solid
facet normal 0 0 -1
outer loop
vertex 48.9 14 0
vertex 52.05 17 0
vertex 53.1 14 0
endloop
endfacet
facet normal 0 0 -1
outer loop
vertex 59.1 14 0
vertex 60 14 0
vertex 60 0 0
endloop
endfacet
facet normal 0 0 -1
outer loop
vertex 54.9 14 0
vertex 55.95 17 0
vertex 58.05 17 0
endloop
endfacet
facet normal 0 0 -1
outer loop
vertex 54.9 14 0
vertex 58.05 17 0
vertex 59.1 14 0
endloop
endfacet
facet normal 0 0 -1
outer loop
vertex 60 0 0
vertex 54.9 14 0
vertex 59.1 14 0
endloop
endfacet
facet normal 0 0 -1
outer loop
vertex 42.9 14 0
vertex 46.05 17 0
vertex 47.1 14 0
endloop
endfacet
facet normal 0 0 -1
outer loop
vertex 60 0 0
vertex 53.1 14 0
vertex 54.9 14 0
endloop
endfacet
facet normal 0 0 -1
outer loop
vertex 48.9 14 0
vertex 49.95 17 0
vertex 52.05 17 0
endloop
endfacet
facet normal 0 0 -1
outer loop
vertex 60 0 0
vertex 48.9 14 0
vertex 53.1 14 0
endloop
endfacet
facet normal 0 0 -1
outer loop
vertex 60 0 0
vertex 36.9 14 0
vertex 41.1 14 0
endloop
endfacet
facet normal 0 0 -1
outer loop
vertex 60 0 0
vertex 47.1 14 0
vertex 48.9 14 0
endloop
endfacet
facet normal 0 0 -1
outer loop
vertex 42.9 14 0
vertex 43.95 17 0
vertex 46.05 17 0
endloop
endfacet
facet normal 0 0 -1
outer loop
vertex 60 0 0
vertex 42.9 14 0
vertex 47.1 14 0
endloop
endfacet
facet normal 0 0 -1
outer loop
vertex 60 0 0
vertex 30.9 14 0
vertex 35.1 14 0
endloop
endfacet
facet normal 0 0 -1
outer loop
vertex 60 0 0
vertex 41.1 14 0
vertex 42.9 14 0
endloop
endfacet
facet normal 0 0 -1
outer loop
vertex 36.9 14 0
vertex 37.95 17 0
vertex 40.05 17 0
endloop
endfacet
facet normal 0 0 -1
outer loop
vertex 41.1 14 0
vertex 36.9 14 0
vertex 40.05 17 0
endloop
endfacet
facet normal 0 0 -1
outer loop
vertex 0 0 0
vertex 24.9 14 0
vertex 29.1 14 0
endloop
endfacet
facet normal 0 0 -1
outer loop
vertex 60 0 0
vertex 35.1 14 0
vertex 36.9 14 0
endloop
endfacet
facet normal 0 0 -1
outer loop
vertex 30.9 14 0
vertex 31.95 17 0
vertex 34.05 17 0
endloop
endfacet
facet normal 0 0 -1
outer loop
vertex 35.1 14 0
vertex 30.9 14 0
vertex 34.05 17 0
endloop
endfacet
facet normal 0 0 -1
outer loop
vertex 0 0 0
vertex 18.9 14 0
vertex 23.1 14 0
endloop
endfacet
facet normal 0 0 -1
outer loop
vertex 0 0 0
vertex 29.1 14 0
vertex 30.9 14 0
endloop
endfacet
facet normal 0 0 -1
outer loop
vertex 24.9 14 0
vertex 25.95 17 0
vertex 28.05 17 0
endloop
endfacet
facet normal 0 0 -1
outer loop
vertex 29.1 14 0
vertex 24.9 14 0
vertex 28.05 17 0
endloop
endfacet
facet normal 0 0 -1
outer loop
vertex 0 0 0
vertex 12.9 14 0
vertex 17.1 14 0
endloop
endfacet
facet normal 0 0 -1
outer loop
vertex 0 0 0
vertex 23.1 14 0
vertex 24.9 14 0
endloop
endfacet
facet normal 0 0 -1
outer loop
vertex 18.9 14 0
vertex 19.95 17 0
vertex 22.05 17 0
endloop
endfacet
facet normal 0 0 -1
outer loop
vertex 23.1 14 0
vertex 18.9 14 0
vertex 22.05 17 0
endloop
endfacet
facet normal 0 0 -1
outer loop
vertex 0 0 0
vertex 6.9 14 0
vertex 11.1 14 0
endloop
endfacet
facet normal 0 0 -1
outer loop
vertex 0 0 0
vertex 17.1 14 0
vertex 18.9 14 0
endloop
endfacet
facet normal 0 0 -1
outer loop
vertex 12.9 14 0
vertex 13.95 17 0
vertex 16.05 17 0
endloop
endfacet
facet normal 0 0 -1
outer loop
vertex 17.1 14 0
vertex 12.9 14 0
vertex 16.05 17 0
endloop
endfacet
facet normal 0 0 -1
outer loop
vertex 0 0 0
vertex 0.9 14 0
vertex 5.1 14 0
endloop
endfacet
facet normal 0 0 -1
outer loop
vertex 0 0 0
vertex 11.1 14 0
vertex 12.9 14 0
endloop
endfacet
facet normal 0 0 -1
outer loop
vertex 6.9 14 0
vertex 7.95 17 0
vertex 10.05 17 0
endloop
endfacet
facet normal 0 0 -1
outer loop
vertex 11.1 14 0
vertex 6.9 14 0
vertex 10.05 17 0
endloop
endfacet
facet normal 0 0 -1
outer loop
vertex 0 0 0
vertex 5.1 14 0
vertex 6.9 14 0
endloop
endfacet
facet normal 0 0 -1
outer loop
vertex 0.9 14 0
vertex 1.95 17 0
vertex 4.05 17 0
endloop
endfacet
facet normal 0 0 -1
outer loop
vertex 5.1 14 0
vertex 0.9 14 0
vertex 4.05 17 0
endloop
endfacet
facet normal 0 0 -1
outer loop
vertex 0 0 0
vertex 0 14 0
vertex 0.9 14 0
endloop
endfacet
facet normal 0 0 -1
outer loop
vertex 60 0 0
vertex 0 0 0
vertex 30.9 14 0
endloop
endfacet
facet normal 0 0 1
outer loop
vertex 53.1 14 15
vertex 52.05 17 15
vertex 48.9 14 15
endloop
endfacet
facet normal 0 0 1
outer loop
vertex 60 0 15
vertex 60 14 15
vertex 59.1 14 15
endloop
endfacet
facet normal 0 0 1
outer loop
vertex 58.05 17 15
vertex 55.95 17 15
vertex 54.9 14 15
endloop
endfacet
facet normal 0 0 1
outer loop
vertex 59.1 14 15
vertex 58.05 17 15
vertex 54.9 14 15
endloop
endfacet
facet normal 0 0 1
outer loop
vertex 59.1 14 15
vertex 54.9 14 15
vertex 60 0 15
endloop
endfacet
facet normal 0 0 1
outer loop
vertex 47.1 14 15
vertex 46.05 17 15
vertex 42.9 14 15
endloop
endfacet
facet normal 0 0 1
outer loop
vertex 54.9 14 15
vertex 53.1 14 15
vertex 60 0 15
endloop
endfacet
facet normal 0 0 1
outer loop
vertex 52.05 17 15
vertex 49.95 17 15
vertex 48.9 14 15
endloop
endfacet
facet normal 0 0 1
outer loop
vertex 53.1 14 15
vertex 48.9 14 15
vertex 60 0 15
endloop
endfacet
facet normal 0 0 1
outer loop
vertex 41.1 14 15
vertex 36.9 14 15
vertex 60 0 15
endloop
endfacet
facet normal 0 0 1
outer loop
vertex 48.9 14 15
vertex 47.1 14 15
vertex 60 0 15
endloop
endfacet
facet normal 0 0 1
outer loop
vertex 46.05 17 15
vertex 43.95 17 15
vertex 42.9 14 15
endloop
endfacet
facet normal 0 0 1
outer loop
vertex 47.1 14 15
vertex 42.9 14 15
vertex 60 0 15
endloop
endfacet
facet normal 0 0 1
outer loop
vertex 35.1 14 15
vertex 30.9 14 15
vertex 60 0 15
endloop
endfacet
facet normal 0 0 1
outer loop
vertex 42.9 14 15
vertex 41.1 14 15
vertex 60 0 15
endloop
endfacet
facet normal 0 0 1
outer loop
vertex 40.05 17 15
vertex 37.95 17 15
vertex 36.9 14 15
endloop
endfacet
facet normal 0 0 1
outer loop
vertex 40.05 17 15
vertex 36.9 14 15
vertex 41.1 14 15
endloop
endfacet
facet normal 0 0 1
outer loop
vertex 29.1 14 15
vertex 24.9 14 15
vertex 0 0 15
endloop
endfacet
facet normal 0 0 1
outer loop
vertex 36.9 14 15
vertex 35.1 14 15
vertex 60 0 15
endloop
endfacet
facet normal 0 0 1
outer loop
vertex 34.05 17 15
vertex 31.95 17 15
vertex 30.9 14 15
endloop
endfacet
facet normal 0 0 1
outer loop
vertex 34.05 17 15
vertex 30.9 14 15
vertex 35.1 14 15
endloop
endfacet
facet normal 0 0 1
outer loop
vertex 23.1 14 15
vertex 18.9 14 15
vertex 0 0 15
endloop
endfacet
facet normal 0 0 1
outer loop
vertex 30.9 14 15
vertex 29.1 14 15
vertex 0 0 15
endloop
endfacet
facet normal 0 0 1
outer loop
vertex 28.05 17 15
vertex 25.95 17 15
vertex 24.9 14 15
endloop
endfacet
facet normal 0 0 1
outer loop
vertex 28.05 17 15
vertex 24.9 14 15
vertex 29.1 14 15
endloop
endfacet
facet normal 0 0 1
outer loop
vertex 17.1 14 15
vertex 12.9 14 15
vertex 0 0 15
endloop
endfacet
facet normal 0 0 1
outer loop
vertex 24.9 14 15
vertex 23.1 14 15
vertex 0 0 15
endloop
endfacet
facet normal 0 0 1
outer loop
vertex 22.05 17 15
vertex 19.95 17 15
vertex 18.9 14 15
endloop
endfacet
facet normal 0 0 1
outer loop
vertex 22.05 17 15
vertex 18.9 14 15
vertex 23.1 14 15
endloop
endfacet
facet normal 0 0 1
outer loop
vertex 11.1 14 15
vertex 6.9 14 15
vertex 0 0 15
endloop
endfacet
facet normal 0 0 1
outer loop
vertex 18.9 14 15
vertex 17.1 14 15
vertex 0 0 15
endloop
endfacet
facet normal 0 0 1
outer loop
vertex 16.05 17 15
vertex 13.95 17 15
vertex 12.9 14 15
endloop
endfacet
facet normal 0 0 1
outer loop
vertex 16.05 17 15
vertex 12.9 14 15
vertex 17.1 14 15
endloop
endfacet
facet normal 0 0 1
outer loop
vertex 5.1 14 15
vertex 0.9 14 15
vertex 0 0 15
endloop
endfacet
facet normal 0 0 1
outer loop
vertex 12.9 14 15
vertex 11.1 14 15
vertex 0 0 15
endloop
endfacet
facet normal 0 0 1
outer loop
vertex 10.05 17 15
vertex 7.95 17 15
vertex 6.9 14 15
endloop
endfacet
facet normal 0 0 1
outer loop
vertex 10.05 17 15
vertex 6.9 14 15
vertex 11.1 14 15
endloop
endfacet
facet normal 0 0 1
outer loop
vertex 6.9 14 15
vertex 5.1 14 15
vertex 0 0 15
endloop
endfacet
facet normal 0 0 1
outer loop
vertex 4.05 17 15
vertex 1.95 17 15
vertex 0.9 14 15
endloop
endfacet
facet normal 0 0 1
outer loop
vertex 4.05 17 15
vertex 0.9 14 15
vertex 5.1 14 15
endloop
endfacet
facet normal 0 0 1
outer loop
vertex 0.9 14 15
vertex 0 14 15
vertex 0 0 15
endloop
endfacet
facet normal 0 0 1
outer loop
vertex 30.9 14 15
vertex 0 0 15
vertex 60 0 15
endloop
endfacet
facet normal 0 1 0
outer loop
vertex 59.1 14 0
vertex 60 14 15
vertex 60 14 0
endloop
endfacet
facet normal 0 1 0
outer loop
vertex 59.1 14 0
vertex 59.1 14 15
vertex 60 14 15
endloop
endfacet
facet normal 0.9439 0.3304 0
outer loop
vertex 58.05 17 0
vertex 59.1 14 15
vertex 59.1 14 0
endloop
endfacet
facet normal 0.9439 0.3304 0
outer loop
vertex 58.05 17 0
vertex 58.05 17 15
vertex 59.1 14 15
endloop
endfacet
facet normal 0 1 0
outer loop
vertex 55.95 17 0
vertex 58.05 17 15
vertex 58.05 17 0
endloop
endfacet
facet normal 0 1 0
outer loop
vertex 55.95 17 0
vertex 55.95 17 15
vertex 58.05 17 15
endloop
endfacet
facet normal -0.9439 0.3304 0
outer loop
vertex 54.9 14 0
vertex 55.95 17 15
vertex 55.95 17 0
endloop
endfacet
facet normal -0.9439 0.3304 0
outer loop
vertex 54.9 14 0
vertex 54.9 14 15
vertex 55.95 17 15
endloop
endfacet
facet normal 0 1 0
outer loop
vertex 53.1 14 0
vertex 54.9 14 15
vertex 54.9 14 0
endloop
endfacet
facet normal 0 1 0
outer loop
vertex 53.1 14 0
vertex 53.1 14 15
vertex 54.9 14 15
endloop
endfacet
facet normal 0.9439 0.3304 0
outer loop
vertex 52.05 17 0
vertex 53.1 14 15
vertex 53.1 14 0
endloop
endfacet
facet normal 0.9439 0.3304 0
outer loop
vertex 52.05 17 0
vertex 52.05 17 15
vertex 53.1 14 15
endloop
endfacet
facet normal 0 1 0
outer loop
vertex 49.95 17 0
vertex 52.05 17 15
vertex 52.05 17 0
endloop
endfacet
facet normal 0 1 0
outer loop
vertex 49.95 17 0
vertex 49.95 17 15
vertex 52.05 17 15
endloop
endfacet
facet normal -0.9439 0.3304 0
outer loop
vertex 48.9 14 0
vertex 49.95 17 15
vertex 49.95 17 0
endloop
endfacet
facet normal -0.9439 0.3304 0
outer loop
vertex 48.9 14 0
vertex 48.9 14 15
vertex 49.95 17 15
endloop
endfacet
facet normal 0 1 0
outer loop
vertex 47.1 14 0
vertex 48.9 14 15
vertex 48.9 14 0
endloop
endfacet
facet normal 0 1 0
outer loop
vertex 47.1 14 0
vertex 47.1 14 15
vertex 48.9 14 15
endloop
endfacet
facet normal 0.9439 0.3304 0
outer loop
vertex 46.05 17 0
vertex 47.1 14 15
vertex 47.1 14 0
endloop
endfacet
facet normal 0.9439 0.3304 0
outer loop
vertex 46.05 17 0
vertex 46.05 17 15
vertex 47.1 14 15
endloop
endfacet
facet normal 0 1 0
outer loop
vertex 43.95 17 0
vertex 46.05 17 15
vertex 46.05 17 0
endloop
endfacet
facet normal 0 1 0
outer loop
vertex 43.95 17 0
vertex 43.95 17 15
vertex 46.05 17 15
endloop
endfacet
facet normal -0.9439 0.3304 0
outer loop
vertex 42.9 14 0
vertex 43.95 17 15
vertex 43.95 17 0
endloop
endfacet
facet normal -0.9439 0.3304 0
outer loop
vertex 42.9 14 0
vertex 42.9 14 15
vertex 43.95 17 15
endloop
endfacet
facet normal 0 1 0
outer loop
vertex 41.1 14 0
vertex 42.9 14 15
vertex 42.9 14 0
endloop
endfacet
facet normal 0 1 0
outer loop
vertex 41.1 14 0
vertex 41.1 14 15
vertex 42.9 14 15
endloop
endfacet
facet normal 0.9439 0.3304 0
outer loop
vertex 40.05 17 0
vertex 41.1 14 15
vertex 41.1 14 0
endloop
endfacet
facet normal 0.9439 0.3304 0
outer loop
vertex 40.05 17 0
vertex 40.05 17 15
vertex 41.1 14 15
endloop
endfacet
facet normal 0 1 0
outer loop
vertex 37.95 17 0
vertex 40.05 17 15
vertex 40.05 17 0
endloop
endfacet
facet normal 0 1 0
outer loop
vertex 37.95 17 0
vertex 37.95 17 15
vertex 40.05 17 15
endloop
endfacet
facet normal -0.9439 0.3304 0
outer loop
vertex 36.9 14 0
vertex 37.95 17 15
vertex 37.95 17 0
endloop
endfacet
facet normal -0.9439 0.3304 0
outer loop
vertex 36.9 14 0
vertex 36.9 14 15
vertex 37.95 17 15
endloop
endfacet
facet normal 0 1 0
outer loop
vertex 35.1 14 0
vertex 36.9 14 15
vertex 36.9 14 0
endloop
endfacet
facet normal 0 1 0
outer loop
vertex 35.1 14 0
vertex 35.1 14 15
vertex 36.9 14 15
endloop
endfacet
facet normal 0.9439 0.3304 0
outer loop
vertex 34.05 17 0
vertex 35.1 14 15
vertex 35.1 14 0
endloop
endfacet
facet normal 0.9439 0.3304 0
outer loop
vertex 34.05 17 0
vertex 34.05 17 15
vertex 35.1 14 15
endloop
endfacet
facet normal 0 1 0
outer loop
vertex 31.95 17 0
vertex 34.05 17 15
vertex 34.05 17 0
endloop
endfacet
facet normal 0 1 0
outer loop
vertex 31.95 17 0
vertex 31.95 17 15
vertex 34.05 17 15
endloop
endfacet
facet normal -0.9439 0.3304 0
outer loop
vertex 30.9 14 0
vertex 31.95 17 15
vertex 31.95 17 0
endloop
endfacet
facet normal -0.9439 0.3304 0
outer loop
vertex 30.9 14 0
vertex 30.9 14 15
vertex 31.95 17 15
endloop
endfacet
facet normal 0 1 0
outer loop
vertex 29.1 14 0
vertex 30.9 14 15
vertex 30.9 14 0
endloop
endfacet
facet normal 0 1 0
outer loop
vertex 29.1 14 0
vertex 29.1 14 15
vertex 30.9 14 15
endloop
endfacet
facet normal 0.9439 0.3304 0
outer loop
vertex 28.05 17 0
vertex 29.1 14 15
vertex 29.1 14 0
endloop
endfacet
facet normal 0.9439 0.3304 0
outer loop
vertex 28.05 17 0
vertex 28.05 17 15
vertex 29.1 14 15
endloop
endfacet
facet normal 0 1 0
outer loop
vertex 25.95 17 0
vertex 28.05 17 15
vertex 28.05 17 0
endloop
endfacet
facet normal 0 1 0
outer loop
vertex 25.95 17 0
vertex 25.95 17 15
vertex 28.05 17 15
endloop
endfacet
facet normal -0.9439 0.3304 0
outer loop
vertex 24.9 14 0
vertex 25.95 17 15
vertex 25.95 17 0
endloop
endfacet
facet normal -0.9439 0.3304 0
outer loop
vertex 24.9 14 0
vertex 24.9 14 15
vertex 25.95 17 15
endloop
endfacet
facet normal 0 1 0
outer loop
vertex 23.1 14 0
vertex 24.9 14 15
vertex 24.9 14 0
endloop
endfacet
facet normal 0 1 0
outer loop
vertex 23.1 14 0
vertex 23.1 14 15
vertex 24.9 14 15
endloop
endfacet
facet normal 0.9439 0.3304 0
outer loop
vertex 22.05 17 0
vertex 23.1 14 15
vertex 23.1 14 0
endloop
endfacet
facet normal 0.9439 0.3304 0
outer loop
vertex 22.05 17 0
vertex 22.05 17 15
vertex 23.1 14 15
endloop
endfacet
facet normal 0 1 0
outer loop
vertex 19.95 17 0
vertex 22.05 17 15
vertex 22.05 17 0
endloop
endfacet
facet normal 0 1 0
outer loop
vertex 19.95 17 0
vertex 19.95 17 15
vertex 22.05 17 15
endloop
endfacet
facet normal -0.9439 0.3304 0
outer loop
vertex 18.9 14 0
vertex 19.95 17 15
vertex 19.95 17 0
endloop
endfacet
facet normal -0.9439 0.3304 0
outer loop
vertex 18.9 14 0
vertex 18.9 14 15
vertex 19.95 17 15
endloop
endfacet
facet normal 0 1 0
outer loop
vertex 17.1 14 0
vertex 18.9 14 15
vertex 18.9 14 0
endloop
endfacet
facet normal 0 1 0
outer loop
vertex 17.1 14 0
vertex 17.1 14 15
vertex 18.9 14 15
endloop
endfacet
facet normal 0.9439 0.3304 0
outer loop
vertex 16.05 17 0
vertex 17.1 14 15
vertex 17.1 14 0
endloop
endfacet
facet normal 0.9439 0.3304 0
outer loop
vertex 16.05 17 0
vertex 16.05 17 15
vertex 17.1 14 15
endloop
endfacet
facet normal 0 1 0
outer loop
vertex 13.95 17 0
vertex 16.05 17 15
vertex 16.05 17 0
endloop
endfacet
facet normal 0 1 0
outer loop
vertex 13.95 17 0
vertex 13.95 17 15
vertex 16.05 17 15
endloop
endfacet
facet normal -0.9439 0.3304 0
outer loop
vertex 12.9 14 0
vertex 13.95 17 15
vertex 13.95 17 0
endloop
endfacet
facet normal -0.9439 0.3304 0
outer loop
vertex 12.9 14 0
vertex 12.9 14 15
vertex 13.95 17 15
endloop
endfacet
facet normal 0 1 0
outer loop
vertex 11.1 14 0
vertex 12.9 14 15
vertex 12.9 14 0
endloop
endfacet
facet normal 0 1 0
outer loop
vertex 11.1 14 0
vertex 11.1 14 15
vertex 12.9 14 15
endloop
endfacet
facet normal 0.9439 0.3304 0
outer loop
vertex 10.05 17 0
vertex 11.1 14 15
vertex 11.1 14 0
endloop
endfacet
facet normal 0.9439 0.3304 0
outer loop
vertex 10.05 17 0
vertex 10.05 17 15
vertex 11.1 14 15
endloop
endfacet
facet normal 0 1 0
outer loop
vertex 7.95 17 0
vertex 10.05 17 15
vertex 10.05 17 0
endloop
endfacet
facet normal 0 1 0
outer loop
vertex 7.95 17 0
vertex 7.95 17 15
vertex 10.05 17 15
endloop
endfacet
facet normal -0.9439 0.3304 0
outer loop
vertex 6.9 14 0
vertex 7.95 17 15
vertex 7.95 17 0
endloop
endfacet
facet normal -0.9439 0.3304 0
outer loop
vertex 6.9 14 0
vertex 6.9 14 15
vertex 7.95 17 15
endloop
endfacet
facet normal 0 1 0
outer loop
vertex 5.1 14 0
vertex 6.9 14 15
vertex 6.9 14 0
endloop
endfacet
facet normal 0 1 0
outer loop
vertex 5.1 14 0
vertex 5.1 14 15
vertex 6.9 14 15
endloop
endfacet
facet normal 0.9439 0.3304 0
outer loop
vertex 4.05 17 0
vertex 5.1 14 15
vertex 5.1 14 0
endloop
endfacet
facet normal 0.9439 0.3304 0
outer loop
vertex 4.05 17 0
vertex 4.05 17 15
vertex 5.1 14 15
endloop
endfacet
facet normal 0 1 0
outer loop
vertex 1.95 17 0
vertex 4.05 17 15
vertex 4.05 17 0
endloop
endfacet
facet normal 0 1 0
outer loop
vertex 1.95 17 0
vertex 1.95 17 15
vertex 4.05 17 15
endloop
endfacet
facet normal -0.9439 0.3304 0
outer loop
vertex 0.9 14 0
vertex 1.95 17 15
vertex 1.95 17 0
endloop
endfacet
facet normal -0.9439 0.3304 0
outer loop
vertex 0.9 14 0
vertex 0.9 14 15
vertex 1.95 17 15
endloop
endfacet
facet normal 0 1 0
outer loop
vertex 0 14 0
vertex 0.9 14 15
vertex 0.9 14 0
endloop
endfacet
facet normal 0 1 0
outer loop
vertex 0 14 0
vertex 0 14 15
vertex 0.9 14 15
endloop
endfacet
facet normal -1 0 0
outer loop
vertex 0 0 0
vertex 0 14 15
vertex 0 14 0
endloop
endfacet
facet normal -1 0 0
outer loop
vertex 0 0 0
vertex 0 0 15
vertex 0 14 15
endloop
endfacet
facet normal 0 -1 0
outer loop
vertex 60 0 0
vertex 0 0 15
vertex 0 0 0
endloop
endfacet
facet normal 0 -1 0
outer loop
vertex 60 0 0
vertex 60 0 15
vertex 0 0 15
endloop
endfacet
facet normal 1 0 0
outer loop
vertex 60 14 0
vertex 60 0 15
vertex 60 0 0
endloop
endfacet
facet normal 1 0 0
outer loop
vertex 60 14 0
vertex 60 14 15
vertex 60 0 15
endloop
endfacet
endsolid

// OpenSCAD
$fn = 32;

// ----------------------------------------------------------------------
// Gear rack: 10 teeth, pitch 6 mm
// ----------------------------------------------------------------------

// --- parameters (mm) ---
teeth = 10;               // number of teeth
pitch = 6;                // tooth pitch, X
root_w = 4.2;             // tooth width at the root
tip_w = 2.1;              // tooth width at the tip
base_h = 14;              // rack body height, Y
tooth_h = 3;              // tooth height above the body
plate_t = 15;             // rack width, Z (extrusion height)

rack_l = teeth * pitch;  // overall length
total_h = base_h + tooth_h;  // overall height

profile = [[0, 0], [60, 0], [60, 14], [59.1, 14], [58.05, 17], [55.95, 17], [54.9, 14], [53.1, 14], [52.05, 17], [49.95, 17], [48.9, 14], [47.1, 14], [46.05, 17], [43.95, 17], [42.9, 14], [41.1, 14], [40.05, 17], [37.95, 17], [36.9, 14], [35.1, 14], [34.05, 17], [31.95, 17], [30.9, 14], [29.1, 14], [28.05, 17], [25.95, 17], [24.9, 14], [23.1, 14], [22.05, 17], [19.95, 17], [18.9, 14], [17.1, 14], [16.05, 17], [13.95, 17], [12.9, 14], [11.1, 14], [10.05, 17], [7.95, 17], [6.9, 14], [5.1, 14], [4.05, 17], [1.95, 17], [0.9, 14], [0, 14]];  // primary outline, 44 points, counter clockwise

// --- the one profile operation ---
linear_extrude(height = plate_t) polygon(points = profile);
